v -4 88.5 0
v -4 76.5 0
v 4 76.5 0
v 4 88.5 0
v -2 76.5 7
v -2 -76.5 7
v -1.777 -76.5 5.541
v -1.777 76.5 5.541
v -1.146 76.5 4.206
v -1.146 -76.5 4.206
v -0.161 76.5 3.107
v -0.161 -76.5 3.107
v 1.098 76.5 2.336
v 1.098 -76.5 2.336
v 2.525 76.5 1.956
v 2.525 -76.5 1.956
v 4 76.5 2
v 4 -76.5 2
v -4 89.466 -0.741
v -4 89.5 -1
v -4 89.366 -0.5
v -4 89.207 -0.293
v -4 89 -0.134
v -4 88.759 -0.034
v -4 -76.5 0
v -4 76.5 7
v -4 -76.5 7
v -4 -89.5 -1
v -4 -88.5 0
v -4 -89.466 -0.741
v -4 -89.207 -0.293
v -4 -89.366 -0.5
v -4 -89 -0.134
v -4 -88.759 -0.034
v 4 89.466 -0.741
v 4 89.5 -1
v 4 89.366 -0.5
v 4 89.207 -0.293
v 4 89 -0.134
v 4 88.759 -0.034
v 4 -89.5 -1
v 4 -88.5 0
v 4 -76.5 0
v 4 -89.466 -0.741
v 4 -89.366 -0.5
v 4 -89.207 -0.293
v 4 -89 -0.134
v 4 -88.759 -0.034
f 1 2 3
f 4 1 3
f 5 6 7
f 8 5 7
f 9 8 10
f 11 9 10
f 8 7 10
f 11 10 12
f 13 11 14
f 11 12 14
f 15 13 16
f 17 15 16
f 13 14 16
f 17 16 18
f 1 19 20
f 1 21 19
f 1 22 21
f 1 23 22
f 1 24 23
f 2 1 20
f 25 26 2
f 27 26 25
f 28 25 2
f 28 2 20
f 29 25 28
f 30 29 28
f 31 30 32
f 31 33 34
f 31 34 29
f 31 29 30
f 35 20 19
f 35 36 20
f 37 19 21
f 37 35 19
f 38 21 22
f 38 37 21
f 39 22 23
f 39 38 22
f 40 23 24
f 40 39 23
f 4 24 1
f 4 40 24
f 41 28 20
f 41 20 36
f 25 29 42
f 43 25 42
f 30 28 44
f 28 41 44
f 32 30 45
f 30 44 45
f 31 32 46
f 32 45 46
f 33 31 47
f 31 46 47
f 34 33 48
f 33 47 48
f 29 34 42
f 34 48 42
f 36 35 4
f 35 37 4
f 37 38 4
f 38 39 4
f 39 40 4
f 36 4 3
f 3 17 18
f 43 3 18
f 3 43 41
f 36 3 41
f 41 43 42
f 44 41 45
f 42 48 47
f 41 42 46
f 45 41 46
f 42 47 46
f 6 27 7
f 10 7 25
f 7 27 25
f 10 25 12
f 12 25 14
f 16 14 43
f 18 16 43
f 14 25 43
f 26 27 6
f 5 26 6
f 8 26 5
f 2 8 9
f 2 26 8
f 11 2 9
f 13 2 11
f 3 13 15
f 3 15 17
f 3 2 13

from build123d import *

# Parameters (mm, degrees)
F0_W     = 8
F0_H     = 153
F1_DEPTH = 7
F3_DEPTH = 160
F4_W     = 8
F4_H     = 179
F5_DEPTH = 1
F6_R     = 0.99999


# Not quite as in the source:
# - a fillet or chamfer is up to 0.001 mm smaller than in the source, because OpenCascade refuses the exact size


with BuildPart() as f1:
    # F0 (on Top) → F1 (new body)
    with BuildSketch(Plane.XY):
        Rectangle(F0_W, F0_H)
    extrude(amount=F1_DEPTH)

    # F2 (on face) → F3 (cut)
    with BuildSketch(Plane.XZ.offset(76.5)):
        with BuildLine():
            Line((4, 7), (-2, 7))
            ThreePointArc((-2, 7), (-0.1605232856, 3.1073720572), (4, 2))
            Line((4, 2), (4, 7))
        make_face()
    extrude(amount=-F3_DEPTH, mode=Mode.SUBTRACT)

    # F4 (on face) → F5 (join)
    with BuildSketch(Plane(origin=(0, 0, 0), x_dir=(1, 0, 0), z_dir=(0, 0, -1))):
        Rectangle(F4_W, F4_H)
    extrude(amount=F5_DEPTH)

    # F6 (radius 1 in the source; OpenCascade refuses exactly that, so slightly less here)
    f6_edges = [f1.edges().sort_by_distance(p)[0] for p in [
        (0, -89.5, 0),
        (0, 89.5, 0),
    ]]
    fillet(f6_edges, radius=F6_R)


solid = f1.part
